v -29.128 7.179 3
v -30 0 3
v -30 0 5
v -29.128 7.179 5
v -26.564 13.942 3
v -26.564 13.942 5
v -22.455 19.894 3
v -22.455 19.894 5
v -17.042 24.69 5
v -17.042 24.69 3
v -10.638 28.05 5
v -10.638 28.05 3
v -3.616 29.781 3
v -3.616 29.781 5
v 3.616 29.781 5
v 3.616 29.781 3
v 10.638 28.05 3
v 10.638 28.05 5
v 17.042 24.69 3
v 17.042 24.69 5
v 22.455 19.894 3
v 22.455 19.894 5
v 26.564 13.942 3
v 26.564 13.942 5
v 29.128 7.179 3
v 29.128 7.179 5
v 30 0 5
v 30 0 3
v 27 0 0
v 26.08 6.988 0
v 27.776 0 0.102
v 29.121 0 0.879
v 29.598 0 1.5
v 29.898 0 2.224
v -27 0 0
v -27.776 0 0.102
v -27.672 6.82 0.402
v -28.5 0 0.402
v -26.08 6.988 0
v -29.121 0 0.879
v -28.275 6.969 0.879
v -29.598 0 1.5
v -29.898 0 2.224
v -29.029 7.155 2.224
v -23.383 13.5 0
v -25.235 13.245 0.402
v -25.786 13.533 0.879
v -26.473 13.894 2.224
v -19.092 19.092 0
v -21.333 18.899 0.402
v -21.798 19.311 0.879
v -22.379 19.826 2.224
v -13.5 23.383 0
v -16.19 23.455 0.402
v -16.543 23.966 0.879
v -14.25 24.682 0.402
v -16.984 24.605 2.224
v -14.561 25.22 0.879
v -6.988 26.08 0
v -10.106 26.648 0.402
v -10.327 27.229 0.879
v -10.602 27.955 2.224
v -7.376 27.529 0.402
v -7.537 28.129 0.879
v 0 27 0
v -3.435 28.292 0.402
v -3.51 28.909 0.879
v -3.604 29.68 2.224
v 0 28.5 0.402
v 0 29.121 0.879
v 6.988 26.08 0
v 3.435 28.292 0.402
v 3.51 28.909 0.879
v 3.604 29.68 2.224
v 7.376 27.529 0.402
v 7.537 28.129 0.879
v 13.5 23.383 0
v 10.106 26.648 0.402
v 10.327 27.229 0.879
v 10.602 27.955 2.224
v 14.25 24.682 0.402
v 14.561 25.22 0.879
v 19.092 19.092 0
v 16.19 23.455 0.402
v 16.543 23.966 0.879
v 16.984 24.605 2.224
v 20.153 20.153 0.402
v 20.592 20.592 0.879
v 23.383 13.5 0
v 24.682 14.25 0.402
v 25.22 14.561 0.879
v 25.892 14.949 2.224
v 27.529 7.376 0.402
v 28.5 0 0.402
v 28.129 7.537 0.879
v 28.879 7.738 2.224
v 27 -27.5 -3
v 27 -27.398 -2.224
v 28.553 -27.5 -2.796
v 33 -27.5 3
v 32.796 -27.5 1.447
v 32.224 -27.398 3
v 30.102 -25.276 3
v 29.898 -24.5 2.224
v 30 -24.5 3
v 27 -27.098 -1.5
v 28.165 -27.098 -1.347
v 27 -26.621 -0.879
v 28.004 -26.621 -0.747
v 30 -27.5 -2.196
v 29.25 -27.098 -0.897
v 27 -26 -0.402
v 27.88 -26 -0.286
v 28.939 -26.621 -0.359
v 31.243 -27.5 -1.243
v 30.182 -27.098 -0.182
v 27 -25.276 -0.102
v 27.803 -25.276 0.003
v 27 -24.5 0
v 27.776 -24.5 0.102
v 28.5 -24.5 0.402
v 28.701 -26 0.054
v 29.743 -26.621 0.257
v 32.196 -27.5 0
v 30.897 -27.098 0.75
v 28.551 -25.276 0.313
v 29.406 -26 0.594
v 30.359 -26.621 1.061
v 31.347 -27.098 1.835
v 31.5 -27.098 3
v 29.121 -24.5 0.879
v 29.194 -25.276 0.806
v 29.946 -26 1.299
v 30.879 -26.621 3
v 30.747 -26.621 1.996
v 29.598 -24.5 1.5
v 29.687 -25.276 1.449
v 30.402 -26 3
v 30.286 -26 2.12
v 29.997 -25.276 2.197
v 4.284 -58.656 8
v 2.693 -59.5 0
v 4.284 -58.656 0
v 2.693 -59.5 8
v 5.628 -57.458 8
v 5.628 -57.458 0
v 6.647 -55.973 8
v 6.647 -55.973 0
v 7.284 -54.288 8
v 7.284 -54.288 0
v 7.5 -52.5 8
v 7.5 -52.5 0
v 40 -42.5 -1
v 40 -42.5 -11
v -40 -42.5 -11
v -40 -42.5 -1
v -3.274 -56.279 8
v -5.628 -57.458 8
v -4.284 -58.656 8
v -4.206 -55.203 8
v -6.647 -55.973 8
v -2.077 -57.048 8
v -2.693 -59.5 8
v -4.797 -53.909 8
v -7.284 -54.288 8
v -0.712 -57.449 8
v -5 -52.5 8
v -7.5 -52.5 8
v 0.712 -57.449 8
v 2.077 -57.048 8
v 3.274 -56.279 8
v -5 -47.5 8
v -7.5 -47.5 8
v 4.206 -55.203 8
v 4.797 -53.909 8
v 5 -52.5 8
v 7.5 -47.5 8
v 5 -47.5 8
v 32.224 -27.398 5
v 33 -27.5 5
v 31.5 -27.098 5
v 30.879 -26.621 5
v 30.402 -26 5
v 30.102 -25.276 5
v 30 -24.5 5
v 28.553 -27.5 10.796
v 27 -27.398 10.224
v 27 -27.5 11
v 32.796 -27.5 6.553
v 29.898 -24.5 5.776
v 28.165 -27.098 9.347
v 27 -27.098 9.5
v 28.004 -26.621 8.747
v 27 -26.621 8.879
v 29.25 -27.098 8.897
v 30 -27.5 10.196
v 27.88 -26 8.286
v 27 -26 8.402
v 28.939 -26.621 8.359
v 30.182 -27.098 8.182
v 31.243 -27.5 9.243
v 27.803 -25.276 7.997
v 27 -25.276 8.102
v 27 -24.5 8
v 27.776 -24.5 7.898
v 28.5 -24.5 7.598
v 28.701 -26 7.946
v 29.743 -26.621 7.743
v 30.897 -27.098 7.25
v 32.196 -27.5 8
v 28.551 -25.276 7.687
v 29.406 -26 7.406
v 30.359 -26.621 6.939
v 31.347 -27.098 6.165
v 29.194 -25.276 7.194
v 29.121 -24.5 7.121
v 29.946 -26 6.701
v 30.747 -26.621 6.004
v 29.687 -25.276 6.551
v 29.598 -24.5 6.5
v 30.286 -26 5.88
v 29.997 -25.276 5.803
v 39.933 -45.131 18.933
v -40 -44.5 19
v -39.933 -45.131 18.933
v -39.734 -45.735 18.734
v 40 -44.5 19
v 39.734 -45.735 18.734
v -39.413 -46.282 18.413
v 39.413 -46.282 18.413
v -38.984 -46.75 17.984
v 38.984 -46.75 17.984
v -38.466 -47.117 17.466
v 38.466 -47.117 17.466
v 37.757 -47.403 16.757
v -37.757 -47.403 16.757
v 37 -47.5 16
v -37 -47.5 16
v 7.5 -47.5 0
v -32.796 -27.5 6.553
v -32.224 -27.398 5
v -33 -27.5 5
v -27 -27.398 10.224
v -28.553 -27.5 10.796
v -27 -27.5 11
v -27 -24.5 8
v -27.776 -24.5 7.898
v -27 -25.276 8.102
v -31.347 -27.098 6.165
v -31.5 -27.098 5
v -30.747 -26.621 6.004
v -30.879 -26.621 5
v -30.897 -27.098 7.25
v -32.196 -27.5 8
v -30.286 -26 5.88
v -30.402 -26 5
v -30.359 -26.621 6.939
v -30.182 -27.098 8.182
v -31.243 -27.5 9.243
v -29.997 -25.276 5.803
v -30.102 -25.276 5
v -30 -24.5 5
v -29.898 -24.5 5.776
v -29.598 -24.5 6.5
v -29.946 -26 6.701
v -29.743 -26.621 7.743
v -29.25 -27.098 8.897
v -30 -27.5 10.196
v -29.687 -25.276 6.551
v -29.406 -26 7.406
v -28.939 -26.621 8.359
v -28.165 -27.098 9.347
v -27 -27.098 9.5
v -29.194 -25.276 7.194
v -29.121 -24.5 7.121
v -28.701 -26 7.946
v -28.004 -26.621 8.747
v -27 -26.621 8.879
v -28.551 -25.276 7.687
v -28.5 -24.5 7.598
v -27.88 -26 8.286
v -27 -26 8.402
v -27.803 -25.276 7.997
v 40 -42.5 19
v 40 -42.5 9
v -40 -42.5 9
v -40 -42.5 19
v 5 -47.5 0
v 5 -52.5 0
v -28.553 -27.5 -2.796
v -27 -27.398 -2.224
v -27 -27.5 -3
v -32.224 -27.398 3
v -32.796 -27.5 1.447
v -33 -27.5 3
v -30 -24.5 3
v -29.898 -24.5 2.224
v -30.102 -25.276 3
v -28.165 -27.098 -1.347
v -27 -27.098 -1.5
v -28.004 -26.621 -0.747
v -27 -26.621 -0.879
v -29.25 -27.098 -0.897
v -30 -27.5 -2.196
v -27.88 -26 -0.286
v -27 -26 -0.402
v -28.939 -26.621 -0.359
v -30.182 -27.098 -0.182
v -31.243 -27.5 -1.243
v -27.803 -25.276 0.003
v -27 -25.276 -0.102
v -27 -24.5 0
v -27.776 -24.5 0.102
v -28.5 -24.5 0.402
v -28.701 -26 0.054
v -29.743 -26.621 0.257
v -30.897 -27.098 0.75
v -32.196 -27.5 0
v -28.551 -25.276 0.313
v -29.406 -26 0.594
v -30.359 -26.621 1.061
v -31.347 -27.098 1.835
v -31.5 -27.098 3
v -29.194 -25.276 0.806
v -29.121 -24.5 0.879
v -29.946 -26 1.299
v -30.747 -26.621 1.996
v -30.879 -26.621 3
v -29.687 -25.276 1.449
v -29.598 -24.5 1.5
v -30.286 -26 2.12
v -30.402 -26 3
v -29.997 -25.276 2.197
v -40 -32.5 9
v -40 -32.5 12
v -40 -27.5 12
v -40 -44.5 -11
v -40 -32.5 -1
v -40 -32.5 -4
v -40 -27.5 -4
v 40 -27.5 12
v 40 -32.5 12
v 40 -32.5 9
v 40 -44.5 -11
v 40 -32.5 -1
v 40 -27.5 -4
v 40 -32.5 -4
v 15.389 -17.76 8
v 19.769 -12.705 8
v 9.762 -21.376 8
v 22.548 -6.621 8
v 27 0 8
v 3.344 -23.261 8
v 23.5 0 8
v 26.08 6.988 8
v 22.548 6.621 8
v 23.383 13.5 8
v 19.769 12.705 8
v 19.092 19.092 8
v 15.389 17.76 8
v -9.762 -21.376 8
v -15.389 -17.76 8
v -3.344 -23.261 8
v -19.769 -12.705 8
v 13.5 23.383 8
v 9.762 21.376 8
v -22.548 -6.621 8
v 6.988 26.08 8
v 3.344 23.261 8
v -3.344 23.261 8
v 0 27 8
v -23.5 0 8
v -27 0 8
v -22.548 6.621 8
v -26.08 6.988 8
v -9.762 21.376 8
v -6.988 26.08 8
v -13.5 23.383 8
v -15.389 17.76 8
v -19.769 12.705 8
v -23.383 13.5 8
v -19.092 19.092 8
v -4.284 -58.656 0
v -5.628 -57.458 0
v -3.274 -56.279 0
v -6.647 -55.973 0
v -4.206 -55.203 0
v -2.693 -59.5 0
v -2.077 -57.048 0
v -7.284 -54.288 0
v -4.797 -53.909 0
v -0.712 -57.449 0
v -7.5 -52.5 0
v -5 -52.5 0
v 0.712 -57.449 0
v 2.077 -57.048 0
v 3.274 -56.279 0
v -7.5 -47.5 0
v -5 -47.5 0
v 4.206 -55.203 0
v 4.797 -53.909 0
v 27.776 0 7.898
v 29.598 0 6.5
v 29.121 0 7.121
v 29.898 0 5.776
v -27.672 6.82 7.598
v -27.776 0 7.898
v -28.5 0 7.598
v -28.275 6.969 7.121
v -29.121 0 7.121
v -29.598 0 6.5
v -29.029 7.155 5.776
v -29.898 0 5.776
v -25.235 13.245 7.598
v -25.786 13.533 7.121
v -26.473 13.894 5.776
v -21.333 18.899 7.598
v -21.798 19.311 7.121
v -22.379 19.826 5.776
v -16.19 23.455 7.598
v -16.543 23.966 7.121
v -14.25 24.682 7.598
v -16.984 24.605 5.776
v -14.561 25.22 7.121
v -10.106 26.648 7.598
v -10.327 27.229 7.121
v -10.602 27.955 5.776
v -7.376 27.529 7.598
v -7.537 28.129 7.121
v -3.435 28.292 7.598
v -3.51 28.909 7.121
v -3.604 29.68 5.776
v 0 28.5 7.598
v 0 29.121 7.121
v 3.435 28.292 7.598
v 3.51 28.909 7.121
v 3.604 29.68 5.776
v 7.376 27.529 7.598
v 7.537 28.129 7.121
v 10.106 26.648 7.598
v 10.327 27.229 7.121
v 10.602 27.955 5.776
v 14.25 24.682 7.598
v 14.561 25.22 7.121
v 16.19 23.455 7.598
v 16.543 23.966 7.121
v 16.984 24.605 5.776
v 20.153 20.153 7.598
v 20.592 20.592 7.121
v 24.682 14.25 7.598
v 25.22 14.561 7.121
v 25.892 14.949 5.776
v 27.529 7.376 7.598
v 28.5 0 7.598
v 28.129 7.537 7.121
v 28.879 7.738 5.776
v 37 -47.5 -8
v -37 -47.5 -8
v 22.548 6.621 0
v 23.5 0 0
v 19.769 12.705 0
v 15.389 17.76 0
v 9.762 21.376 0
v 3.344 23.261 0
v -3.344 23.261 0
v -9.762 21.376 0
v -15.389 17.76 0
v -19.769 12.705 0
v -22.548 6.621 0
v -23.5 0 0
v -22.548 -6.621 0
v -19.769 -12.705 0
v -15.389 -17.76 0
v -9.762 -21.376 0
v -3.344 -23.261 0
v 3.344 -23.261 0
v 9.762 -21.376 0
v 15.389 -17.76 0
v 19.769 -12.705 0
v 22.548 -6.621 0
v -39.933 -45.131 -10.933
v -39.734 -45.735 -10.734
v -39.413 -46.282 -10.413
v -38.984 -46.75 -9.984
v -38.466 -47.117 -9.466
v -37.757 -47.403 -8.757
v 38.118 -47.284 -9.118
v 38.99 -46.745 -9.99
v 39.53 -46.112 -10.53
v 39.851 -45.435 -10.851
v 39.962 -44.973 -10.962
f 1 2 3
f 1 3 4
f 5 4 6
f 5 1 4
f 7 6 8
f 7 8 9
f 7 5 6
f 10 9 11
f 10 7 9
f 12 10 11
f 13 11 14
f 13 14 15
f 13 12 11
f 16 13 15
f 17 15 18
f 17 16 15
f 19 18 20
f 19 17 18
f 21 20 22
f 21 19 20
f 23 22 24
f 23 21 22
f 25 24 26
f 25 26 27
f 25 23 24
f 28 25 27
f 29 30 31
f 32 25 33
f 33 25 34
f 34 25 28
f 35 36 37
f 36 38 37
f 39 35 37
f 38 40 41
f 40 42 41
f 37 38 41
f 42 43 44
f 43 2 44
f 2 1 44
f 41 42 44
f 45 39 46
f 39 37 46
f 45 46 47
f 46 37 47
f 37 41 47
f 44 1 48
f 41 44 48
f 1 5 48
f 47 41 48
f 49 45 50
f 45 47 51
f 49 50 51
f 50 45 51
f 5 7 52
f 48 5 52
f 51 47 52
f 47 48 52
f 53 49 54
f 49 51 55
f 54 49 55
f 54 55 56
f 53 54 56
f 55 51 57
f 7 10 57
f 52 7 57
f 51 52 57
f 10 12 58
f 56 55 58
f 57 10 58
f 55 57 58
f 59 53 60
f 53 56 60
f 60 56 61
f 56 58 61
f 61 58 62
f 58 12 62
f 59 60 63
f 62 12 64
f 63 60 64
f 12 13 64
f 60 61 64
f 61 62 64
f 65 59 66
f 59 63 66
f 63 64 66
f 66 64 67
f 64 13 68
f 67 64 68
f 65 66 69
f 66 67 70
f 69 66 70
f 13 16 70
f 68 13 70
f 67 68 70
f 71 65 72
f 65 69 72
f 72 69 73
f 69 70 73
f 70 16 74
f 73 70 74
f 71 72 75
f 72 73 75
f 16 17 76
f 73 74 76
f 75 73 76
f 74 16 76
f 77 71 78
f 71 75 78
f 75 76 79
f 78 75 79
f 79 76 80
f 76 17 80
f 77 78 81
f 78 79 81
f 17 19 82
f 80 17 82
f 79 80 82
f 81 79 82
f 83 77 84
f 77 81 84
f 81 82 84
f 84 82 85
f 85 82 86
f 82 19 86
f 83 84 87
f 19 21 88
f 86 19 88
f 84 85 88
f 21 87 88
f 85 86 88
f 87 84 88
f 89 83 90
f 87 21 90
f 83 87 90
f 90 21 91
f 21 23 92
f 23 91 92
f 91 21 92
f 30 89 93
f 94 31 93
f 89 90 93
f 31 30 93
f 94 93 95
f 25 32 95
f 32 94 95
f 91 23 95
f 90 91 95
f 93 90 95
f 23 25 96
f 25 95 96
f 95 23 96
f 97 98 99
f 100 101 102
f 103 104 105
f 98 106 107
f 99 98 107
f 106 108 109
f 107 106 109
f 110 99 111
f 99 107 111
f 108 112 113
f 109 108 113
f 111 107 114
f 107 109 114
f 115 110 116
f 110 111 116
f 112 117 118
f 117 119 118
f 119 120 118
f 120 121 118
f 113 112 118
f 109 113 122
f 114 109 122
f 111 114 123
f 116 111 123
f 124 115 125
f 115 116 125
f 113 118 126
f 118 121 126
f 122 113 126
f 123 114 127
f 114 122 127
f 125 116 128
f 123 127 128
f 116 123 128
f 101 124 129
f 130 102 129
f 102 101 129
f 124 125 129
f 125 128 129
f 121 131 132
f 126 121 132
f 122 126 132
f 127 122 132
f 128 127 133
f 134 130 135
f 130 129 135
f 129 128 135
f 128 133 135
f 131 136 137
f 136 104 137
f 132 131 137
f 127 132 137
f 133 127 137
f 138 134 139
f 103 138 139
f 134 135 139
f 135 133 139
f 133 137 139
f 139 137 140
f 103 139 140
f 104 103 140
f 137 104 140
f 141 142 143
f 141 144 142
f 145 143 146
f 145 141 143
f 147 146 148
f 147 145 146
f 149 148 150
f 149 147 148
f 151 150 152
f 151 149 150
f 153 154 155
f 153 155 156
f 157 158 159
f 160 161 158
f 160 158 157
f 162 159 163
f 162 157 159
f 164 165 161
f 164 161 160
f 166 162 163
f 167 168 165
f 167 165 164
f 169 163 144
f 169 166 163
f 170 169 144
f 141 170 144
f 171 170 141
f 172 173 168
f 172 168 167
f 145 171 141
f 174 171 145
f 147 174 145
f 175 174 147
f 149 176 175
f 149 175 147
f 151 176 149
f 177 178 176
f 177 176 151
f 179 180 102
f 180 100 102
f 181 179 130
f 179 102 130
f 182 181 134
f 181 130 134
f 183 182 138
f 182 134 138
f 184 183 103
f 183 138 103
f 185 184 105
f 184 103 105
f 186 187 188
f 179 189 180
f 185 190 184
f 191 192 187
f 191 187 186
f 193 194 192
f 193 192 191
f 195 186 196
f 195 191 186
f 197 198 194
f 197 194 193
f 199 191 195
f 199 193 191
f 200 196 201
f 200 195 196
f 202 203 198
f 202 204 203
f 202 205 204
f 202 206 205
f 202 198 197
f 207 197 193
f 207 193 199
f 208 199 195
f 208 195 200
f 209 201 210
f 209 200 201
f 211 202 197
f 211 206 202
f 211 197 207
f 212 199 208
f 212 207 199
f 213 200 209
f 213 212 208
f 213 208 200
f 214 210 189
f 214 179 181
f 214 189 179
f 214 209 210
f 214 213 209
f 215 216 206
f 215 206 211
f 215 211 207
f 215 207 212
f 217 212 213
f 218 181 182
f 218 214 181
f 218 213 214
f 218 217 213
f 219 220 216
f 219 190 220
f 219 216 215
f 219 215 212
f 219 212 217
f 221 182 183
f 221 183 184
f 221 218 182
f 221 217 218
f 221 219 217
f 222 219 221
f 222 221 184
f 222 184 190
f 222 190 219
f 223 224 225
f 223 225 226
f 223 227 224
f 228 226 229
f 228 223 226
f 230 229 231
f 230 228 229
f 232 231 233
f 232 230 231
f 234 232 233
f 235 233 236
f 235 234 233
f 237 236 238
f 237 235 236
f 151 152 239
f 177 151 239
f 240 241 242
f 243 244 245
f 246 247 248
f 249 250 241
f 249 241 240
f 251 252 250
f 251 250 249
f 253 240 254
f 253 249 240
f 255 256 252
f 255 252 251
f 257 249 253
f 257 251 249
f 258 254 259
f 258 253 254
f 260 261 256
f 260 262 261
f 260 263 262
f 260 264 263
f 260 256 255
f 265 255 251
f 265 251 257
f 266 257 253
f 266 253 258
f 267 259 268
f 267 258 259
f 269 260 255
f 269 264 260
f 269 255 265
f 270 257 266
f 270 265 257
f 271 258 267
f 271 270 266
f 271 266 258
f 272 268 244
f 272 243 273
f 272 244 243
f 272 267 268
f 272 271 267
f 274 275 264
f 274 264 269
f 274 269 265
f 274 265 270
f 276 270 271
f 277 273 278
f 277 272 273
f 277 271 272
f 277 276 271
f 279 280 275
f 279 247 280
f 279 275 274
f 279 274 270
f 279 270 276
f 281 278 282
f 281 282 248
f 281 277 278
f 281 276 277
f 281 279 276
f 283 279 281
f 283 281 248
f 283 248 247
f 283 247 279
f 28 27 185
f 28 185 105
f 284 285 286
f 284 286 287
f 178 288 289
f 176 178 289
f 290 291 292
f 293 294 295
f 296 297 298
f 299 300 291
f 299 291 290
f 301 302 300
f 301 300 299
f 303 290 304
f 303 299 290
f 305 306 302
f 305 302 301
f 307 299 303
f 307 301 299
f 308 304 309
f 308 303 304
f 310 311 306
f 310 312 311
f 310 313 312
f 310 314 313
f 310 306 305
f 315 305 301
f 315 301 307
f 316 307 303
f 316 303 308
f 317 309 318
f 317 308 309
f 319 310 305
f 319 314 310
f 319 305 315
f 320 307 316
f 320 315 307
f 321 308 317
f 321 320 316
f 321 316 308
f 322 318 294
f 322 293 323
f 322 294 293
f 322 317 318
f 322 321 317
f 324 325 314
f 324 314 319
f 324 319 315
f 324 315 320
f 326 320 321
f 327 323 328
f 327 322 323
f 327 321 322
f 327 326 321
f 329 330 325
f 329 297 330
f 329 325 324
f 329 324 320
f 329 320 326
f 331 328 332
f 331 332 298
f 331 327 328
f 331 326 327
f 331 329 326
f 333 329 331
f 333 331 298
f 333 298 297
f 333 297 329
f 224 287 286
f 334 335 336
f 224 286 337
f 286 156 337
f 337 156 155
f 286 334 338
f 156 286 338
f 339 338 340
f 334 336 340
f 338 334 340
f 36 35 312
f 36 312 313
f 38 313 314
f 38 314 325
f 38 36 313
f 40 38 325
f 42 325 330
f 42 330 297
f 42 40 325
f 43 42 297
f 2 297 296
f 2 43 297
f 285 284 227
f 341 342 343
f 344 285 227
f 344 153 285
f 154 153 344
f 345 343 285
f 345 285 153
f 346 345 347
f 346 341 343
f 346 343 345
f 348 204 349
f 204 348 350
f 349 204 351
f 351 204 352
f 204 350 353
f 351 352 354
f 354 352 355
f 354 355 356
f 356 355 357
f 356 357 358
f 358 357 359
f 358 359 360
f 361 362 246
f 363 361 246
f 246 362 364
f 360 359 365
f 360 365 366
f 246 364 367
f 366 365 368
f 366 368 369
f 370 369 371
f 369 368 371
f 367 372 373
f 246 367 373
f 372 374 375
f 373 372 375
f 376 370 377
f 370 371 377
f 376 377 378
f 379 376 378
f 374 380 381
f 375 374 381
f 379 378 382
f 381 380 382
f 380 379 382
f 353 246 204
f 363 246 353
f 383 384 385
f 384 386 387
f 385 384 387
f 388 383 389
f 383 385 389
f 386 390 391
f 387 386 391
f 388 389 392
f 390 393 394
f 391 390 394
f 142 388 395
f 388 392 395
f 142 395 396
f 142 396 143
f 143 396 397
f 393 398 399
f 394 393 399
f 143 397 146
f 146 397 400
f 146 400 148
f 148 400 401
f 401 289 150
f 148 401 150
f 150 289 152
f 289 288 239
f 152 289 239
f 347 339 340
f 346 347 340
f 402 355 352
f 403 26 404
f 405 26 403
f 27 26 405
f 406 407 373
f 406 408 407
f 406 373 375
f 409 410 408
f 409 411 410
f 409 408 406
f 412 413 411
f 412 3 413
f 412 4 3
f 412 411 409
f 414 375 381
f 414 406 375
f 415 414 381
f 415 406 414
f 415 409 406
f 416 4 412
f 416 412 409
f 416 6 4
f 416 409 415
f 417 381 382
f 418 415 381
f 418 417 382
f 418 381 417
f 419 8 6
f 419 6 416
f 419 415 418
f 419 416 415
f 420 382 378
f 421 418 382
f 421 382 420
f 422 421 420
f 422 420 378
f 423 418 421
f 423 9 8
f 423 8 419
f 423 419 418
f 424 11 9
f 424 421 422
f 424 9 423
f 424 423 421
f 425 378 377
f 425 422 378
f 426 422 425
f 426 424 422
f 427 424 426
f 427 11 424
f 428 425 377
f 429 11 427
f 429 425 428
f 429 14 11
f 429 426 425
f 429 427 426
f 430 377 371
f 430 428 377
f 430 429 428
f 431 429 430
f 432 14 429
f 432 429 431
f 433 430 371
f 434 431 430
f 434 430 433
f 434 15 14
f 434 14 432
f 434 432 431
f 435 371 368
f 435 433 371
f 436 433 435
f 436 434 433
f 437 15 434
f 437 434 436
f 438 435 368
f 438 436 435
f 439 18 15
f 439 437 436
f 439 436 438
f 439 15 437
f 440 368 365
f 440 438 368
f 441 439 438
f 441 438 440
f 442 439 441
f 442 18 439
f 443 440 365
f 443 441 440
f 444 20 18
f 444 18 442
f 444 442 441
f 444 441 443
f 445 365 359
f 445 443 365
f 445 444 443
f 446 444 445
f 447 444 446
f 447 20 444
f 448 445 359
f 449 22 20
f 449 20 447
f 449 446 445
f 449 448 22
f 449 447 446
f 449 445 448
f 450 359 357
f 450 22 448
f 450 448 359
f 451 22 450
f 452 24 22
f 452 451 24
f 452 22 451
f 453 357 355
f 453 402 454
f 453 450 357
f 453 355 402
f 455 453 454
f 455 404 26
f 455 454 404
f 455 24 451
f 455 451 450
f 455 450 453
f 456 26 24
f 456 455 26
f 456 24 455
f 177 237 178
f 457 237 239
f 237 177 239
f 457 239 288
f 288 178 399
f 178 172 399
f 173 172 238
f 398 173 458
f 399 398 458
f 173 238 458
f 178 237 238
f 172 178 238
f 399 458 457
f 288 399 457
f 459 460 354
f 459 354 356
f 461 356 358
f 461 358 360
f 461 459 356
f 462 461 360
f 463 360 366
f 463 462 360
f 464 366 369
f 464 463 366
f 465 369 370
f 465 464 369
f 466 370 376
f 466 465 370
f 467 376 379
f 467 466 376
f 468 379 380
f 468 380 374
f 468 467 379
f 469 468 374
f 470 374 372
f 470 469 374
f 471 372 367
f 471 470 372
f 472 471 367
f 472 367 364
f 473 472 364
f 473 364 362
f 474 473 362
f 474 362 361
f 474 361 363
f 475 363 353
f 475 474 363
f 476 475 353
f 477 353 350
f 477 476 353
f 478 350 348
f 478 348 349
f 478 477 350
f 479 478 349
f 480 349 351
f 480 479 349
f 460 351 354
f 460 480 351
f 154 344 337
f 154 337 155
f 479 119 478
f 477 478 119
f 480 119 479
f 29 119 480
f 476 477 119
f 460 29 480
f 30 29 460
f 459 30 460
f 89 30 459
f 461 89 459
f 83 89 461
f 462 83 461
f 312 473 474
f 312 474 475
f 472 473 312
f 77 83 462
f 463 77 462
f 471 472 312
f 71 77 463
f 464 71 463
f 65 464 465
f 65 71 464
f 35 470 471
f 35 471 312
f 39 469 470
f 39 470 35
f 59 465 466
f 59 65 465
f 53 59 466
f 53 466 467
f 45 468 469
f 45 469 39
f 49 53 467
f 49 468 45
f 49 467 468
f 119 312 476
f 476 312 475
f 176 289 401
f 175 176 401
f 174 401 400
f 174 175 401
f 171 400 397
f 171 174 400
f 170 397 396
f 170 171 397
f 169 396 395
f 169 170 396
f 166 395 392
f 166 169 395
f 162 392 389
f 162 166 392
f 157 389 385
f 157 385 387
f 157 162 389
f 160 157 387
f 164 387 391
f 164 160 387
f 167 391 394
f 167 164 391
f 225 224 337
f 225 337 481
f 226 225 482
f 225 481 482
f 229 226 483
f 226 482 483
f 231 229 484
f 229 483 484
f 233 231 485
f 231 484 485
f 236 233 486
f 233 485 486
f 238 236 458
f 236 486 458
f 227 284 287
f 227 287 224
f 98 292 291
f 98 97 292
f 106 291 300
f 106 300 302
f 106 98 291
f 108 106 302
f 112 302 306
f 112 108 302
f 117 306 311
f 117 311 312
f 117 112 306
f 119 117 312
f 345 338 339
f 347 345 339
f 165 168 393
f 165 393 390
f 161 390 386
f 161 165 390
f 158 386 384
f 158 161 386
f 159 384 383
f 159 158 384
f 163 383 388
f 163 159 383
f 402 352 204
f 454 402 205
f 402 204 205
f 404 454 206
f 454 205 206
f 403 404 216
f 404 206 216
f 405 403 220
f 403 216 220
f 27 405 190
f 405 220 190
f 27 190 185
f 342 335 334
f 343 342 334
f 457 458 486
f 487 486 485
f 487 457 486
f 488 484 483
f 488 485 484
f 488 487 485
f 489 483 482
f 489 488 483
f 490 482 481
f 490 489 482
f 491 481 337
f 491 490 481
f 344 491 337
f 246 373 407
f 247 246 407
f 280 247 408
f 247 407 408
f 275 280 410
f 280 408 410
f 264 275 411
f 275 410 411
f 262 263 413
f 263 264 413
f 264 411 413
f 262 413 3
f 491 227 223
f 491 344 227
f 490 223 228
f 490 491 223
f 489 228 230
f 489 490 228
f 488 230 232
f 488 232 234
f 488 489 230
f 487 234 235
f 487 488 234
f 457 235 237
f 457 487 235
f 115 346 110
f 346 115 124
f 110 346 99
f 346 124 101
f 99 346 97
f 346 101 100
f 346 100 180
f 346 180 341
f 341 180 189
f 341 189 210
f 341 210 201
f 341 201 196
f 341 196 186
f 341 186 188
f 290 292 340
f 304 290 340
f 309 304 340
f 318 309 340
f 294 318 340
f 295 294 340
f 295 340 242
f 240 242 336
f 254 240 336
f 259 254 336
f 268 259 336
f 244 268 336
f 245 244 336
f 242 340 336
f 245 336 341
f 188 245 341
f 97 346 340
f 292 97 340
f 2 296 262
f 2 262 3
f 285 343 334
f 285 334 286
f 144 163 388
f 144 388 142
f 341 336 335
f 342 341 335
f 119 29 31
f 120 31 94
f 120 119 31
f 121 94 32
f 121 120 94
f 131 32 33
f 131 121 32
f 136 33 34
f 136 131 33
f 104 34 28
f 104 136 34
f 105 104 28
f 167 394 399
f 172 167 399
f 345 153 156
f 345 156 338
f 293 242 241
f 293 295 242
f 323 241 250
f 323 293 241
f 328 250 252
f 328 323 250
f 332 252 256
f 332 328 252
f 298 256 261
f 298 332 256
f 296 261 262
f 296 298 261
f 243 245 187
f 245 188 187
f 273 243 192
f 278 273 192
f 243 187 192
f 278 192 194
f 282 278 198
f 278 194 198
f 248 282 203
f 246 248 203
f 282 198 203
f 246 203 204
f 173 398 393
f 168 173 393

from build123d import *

# Parameters (mm, degrees)
SKETCH_1_R      = 23.5
EXTRUDE_1_DEPTH = 8
EXTRUDE_2_DEPTH = 70
FILLET_1_R      = 3
FILLET_2_R      = 3
EXTRUDE_3_DEPTH = 4


with BuildPart() as part:
    # 草图1 → 凸台-拉伸1 (new body)
    with BuildSketch(Plane.XY):
        with BuildLine():
            Line((30, -32.5), (-30, -32.5))
            Line((-30, -32.5), (-30, 0))
            ThreePointArc((-30, 0), (0, 30), (30, 0))
            Line((30, 0), (30, -32.5))
        make_face()
        Circle(SKETCH_1_R, mode=Mode.SUBTRACT)
    extrude(amount=EXTRUDE_1_DEPTH)

    # 草图2 → 凸台-拉伸2 (add)
    with BuildSketch(Plane(origin=(30, 0, 0), x_dir=(0, 0, -1), z_dir=(1, 0, 0))):
        Polygon((1, -32.5), (4, -32.5), (4, -27.5), (-12, -27.5), (-12, -32.5), (-9, -32.5), (-9, -42.5), (-19, -42.5), (-19, -47.5), (11, -47.5), (11, -42.5), (1, -42.5), align=None)
    extrude_2 = extrude(amount=-EXTRUDE_2_DEPTH)

    # 镜向1: 凸台-拉伸2 across plane
    add(extrude_2.mirror(Plane.ZY))

    # 圆角1
    fillet_1_edges = [part.edges().sort_by_distance(p)[0] for p in [
        (30, -13.75, 0),
        (30, -13.75, 8),
        (0, -27.5, 0),
        (-30, -27.5, 4),
        (0, -27.5, 8),
        (0, 30, 8),
        (-30, -13.75, 0),
        (0, 30, 0),
        (30, -27.5, 4),
        (-30, -13.75, 8),
    ]]
    fillet(fillet_1_edges, radius=FILLET_1_R)

    # 圆角2
    fillet_2_edges = [part.edges().sort_by_distance(p)[0] for p in [
        (-40, -47.5, 4),
        (0, -47.5, -11),
        (0, -47.5, 19),
        (40, -47.5, 4),
    ]]
    fillet(fillet_2_edges, radius=FILLET_2_R)

    # 草图4 → 凸台-拉伸3 (add, symmetric)
    with BuildSketch(Plane.XY.offset(4)):
        with BuildLine():
            Line((7.5, -47.5), (5, -47.5))
            Line((5, -47.5), (5, -52.5))
            ThreePointArc((5, -52.5), (0, -57.5), (-5, -52.5))
            Line((-5, -52.5), (-5, -47.5))
            Line((-5, -47.5), (-7.5, -47.5))
            Line((-7.5, -47.5), (-7.5, -52.5))
            ThreePointArc((-7.5, -52.5), (-6.18240924, -56.745917567), (-2.692582404, -59.5))
            Line((-2.692582404, -59.5), (2.692582404, -59.5))
            ThreePointArc((2.692582404, -59.5), (6.18240924, -56.745917567), (7.5, -52.5))
            Line((7.5, -52.5), (7.5, -47.5))
        make_face()
    extrude(amount=EXTRUDE_3_DEPTH, both=True)


solid = part.part
